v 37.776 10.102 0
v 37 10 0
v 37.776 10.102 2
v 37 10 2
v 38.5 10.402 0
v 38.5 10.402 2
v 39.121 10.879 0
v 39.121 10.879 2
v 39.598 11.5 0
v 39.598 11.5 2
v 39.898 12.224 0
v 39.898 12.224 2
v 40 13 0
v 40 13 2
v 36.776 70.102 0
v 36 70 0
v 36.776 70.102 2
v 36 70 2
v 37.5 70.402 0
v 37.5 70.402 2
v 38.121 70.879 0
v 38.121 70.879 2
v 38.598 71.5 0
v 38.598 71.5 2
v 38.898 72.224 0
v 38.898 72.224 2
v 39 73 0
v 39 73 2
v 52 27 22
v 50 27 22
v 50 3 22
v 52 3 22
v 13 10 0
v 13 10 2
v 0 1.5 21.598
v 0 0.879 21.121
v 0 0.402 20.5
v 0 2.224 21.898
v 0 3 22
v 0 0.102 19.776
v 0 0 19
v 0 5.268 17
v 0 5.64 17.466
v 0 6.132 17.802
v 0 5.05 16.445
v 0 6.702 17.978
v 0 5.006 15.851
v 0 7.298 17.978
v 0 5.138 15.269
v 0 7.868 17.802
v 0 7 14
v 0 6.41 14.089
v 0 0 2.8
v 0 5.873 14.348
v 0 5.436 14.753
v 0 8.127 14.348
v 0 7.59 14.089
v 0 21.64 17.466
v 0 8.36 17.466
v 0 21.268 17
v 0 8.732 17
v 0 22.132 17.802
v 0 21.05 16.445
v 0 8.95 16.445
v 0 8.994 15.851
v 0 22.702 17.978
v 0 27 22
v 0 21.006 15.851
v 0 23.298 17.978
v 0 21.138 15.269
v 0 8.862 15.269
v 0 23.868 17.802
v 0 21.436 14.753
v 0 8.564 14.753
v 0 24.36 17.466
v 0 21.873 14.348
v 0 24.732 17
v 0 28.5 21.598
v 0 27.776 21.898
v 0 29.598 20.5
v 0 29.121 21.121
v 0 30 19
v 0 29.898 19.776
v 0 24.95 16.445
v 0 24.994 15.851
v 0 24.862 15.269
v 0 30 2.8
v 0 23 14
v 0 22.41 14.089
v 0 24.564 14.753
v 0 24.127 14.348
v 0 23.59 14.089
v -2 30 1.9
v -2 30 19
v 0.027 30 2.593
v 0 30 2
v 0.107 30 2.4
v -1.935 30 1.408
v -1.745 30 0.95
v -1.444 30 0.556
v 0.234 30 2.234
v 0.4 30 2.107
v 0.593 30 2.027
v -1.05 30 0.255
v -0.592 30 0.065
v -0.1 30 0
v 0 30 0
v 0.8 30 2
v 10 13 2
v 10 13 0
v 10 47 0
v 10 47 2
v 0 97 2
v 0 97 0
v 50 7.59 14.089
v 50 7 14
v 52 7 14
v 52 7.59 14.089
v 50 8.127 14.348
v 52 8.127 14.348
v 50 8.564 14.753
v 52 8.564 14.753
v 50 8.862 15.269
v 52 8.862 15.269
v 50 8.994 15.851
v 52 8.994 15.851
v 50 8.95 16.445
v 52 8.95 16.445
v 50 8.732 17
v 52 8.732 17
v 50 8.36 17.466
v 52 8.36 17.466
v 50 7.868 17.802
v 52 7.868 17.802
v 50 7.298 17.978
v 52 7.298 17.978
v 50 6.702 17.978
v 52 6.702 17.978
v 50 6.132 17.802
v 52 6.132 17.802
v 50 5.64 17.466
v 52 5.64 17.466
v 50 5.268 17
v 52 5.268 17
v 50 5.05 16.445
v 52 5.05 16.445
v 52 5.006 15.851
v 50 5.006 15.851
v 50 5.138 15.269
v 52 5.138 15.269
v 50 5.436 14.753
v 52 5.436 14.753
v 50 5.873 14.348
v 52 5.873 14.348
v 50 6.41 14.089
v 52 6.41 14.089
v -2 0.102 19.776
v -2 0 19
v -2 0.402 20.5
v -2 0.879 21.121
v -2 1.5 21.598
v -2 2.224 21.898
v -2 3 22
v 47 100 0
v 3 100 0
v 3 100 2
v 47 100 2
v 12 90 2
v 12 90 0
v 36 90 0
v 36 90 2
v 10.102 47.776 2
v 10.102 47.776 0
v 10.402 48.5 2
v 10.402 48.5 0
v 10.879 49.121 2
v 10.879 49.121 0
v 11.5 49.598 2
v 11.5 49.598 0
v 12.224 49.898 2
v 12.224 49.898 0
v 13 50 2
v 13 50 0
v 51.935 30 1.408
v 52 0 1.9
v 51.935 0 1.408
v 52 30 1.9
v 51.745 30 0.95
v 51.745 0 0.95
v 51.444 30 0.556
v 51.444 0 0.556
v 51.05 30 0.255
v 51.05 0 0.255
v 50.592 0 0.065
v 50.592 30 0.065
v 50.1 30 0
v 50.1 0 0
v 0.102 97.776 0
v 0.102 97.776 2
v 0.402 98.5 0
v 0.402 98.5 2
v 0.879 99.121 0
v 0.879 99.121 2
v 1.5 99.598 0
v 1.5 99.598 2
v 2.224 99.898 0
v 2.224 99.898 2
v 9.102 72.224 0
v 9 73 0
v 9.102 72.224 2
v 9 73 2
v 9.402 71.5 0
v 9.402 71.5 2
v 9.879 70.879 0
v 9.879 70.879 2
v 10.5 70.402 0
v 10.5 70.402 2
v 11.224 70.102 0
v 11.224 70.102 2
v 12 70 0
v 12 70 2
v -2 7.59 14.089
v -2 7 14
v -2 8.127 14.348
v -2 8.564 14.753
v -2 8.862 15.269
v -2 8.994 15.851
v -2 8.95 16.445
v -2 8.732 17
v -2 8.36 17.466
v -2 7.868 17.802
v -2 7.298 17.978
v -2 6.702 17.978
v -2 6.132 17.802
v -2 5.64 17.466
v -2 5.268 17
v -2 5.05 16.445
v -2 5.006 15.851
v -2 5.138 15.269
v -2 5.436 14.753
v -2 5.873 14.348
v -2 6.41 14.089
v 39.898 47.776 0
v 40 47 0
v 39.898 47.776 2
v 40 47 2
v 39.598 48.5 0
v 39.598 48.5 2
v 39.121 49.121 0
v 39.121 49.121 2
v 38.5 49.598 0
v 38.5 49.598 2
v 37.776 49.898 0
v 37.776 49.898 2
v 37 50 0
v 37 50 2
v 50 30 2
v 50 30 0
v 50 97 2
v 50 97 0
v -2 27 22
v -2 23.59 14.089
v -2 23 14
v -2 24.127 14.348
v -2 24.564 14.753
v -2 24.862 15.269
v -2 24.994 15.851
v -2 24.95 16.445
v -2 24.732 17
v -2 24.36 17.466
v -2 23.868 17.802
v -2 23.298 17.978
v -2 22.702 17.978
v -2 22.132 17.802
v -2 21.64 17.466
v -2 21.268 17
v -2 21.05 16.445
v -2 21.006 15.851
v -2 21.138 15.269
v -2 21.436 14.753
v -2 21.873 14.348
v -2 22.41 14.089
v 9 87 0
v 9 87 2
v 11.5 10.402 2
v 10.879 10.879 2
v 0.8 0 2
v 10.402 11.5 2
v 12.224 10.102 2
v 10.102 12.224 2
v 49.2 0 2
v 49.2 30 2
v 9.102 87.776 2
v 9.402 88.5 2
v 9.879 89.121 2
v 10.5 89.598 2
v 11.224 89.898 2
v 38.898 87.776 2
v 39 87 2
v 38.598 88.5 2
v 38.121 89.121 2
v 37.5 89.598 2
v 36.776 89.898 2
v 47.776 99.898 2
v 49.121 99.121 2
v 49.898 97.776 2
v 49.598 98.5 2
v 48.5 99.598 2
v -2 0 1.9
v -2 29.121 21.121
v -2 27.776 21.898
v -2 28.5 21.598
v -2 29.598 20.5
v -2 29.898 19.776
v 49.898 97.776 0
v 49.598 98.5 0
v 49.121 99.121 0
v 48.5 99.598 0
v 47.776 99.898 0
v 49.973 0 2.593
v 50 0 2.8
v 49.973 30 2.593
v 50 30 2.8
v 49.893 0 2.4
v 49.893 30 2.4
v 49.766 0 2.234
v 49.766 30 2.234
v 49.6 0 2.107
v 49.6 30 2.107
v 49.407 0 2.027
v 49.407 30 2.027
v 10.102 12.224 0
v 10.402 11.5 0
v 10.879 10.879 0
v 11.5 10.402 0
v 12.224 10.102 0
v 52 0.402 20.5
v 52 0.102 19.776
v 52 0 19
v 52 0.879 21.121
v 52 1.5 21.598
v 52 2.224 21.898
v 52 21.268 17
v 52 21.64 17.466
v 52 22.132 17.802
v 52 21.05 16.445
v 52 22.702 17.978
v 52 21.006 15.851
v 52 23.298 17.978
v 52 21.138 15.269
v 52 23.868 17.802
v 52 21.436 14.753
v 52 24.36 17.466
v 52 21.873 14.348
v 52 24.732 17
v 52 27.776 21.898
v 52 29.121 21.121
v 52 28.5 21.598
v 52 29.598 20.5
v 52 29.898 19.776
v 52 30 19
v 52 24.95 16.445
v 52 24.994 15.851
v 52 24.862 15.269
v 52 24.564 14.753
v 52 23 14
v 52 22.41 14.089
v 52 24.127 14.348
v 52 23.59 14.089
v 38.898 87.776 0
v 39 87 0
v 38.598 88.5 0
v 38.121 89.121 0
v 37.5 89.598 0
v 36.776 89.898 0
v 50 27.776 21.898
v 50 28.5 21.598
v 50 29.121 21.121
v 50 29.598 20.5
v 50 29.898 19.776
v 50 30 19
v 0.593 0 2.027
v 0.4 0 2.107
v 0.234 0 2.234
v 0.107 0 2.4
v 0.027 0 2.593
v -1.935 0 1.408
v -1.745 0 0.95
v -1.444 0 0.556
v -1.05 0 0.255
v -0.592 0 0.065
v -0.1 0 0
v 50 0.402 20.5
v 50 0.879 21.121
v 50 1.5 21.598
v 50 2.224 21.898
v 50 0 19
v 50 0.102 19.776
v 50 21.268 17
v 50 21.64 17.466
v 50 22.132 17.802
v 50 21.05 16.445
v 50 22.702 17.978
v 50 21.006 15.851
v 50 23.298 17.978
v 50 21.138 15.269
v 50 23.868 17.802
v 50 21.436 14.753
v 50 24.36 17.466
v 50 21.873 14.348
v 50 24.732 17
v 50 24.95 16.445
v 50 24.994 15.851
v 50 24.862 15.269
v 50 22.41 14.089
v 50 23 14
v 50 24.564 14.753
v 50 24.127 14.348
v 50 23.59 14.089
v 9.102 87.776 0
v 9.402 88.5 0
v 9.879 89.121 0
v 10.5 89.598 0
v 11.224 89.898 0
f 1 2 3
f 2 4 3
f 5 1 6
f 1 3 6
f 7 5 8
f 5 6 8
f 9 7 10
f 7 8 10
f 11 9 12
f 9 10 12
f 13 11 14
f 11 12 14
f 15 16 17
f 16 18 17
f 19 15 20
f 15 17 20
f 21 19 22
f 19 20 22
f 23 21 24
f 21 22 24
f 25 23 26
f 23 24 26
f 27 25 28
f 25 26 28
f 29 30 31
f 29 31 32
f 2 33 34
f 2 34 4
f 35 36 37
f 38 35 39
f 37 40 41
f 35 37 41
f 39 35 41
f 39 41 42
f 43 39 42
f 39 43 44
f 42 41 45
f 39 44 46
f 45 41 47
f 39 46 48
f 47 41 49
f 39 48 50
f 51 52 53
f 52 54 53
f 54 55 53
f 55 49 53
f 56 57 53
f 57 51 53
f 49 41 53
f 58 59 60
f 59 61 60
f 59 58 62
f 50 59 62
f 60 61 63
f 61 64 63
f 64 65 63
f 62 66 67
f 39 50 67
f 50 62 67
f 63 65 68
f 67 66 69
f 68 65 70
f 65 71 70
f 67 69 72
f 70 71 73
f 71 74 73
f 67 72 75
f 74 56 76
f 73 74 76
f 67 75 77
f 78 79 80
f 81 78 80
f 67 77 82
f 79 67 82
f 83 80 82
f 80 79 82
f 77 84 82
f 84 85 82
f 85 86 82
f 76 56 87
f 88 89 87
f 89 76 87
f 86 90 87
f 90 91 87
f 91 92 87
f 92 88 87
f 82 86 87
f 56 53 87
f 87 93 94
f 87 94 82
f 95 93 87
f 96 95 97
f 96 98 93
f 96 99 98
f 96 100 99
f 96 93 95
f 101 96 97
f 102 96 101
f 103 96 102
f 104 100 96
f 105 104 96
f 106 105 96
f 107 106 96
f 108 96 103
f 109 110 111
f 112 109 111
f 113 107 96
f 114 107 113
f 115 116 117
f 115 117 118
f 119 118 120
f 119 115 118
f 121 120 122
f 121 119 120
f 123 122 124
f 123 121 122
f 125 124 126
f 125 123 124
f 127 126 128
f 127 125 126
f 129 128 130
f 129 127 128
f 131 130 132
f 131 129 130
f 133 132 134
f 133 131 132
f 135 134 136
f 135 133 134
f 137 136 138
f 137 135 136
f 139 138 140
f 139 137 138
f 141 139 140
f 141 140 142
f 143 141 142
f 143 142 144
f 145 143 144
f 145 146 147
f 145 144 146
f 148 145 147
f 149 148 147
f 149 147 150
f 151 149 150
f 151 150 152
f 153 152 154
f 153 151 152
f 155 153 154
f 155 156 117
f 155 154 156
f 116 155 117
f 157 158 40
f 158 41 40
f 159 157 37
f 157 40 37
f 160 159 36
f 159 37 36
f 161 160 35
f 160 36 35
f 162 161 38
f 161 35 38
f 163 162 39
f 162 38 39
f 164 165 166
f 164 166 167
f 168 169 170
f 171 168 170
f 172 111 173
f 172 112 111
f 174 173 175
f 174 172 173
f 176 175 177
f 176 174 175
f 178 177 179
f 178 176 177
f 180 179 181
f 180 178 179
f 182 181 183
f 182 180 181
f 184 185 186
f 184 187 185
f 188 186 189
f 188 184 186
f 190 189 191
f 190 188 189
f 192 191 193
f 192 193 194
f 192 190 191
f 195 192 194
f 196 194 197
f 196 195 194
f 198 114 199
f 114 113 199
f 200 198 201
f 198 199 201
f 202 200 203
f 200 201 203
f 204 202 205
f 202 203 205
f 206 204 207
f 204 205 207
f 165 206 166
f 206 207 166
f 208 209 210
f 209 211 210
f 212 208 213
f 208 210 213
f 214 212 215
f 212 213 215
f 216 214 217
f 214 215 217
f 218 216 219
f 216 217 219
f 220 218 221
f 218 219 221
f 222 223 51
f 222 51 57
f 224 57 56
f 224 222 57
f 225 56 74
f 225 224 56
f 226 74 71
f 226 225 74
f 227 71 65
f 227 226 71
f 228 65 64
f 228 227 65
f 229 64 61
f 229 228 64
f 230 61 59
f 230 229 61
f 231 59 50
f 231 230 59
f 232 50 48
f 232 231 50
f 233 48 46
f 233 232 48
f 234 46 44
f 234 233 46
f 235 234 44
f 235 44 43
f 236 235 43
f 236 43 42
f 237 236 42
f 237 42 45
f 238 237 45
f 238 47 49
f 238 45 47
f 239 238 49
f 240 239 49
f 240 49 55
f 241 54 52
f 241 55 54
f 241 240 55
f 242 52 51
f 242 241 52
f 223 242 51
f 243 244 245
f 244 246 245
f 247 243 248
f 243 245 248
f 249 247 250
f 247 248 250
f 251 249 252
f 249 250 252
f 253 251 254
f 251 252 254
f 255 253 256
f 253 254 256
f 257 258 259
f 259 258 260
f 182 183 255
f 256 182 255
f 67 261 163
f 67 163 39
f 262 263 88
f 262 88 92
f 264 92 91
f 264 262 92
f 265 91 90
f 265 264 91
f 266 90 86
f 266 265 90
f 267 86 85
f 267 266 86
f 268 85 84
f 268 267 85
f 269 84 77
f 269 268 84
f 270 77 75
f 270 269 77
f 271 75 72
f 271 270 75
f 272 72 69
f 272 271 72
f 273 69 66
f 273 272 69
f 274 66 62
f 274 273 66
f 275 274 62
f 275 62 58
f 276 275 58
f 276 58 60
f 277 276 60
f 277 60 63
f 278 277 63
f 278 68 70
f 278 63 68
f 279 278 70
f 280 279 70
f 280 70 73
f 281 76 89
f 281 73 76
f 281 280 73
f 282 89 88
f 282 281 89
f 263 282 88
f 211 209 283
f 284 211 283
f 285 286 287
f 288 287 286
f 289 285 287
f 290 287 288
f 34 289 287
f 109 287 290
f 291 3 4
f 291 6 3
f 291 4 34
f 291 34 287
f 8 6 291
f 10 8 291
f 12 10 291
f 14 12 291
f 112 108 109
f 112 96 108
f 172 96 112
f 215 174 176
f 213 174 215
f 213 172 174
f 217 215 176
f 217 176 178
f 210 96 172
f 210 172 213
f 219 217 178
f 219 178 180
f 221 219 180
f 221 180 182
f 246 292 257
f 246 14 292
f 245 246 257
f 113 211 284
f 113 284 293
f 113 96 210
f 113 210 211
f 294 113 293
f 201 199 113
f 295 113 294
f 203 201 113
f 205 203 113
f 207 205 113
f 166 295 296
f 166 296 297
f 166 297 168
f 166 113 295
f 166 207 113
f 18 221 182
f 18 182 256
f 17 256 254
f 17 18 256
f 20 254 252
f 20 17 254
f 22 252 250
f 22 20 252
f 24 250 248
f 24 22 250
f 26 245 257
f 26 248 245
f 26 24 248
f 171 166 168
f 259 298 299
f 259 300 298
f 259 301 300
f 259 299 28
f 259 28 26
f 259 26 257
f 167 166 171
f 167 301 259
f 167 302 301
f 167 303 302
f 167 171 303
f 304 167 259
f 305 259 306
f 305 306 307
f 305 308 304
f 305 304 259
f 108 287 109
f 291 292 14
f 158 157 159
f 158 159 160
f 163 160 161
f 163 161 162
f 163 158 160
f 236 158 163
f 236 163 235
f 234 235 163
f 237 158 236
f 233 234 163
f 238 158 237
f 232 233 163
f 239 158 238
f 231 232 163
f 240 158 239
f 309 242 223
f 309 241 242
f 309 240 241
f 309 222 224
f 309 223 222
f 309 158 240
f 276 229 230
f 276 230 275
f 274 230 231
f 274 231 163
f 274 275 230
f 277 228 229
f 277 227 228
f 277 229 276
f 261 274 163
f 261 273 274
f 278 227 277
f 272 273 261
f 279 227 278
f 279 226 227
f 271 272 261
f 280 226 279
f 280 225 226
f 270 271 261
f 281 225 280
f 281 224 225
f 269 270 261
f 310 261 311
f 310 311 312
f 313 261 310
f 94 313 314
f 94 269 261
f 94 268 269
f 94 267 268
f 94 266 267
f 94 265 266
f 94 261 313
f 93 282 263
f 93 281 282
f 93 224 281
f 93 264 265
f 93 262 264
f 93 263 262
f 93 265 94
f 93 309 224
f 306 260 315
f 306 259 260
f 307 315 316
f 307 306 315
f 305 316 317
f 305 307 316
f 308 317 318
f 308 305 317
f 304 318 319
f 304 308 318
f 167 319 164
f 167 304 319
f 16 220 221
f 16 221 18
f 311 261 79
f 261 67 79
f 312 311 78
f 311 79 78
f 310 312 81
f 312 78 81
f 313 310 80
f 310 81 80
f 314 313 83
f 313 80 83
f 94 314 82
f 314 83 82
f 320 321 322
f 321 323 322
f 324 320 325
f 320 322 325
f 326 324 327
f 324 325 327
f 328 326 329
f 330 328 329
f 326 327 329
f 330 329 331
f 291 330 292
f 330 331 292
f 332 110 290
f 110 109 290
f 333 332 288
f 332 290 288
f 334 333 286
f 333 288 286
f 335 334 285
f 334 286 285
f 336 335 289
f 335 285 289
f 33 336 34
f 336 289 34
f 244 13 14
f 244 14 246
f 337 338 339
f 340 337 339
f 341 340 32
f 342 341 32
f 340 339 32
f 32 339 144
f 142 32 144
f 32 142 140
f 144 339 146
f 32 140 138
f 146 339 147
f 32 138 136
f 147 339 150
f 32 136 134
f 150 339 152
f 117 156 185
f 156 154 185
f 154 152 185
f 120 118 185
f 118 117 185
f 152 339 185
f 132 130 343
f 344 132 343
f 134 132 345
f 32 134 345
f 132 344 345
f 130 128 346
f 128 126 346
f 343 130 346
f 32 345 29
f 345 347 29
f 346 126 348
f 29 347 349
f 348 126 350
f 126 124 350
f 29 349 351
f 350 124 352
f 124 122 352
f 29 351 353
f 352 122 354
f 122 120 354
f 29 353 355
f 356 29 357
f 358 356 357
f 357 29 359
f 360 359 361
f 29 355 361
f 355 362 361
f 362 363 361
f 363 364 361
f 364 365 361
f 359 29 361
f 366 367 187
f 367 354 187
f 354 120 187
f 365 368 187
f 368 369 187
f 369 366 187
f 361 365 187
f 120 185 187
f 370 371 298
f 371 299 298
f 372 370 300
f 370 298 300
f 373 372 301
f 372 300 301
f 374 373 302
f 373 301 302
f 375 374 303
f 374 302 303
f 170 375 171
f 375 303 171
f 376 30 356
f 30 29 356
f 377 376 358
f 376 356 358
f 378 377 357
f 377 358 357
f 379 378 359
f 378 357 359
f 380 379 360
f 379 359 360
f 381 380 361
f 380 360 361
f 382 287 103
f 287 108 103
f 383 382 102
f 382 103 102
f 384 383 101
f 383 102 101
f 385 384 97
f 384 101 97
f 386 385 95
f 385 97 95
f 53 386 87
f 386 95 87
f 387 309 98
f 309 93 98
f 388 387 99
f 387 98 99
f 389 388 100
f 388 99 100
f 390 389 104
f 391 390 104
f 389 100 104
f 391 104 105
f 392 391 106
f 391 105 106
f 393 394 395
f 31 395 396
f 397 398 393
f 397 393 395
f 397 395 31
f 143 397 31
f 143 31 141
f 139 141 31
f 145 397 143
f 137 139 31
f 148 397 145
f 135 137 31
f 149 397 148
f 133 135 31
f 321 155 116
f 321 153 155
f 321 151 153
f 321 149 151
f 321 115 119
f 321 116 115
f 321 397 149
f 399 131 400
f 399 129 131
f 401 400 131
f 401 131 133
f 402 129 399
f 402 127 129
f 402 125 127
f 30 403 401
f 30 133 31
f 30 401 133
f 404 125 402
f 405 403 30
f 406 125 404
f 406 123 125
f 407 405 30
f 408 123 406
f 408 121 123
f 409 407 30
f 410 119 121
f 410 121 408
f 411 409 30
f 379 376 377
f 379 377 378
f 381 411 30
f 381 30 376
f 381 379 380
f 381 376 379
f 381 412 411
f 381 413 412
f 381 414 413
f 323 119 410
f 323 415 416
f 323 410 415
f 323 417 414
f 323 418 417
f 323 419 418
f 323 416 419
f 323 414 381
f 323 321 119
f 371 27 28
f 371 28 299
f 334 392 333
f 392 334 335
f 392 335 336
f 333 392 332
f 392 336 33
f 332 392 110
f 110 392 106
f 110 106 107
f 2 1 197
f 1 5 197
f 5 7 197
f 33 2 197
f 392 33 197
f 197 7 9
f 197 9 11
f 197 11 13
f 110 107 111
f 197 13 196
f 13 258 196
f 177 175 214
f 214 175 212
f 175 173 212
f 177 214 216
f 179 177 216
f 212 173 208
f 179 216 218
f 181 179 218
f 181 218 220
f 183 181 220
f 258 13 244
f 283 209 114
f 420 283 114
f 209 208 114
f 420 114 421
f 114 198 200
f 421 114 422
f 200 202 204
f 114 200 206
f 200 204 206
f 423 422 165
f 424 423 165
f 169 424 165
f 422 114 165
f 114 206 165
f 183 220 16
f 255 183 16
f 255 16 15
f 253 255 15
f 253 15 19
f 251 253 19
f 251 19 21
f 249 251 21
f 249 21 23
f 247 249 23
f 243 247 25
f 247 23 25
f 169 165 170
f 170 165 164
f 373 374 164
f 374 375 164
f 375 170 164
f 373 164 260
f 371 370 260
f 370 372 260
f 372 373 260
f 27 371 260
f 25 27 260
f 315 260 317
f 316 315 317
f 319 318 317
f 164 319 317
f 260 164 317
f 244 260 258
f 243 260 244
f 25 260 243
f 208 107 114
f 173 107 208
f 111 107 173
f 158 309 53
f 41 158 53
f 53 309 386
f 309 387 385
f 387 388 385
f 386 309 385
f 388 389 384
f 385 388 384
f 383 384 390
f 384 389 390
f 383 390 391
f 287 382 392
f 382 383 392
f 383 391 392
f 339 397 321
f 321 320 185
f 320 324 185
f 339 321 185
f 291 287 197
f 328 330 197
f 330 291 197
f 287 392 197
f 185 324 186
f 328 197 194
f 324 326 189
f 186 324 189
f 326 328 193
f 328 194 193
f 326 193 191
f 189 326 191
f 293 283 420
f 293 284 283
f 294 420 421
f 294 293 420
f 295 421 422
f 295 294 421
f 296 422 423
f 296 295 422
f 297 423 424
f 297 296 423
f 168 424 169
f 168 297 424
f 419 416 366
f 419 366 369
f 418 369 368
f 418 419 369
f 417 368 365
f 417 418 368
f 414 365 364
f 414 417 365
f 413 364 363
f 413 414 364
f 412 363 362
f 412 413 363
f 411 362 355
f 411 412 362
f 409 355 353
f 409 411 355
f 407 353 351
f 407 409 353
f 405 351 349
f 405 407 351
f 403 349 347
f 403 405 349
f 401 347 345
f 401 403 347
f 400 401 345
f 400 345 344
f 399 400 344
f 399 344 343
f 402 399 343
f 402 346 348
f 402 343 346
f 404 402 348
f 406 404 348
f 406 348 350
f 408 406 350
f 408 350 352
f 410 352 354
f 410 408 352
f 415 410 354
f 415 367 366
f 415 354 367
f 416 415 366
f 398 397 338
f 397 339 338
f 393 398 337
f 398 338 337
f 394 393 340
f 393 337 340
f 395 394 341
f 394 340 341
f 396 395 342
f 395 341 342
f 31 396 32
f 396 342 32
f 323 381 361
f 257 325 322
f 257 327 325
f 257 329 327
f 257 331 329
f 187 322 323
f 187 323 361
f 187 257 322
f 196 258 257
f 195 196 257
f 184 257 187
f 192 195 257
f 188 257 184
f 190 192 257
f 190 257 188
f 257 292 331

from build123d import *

# Parameters (mm, degrees)
BOX004_W          = 30
BOX004_H          = 20
BOX004_DEPTH      = 7
BOX003_W          = 30
BOX003_H          = 40
BOX003_DEPTH      = 6
CYLINDER001_R     = 2
CYLINDER001_DEPTH = 59
CYLINDER_R        = 2
CYLINDER_DEPTH    = 59
BOX002_W          = 2
BOX002_H          = 30
BOX002_DEPTH      = 22
FILLET_R          = 1.9
BOX001_W          = 2
BOX001_H          = 30
BOX001_DEPTH      = 22
FILLET001_R       = 1.9
BOX_W             = 50
BOX_H             = 100
BOX_DEPTH         = 2
FILLET002_R       = 0.8
FILLET003_R       = 3
FILLET004_R       = 3
FILLET005_R       = 3
FILLET006_R       = 3


with BuildPart() as cub001:
    # Box004 → Box004 (new body)
    with BuildSketch(Plane(origin=(9, 70, -3), x_dir=(1, 0, 0), z_dir=(0, 0, 1))):
        with Locations((15, 10)):
            Rectangle(BOX004_W, BOX004_H)
    extrude(amount=BOX004_DEPTH)


with BuildPart() as cub:
    # Box003 → Box003 (new body)
    with BuildSketch(Plane(origin=(10, 10, -2), x_dir=(1, 0, 0), z_dir=(0, 0, 1))):
        with Locations((15, 20)):
            Rectangle(BOX003_W, BOX003_H)
    extrude(amount=BOX003_DEPTH)


with BuildPart() as cilindre001:
    # Cylinder001 → Cylinder001 (new body)
    with BuildSketch(Plane(origin=(-4, 23, 13), x_dir=(0, 0, -1), z_dir=(1, 0, 0))):
        Circle(CYLINDER001_R)
    extrude(amount=CYLINDER001_DEPTH)


with BuildPart() as cylinders:
    # Cylinder → Cylinder (new body)
    with BuildSketch(Plane(origin=(-4, 7, 13), x_dir=(0, 0, -1), z_dir=(1, 0, 0))):
        Circle(CYLINDER_R)
    extrude(amount=CYLINDER_DEPTH)

    # Fusion001: union Cilindre001
    add(cilindre001.part)


with BuildPart() as cylinders_1:
    # Fusion001 placement: moved
    add(cylinders.part.moved(Location((0, 0, 3))))


with BuildPart() as fillet_body:
    # Box002 → Box002 (new body)
    with BuildSketch(Plane(origin=(-2, 0, 0), x_dir=(1, 0, 0), z_dir=(0, 0, 1))):
        with Locations((1, 15)):
            Rectangle(BOX002_W, BOX002_H)
    extrude(amount=BOX002_DEPTH)

    # Fillet
    fillet_edges = [fillet_body.edges().sort_by_distance(p)[0] for p in [
        (-2, 15, 0),
    ]]
    fillet(fillet_edges, radius=FILLET_R)


with BuildPart() as fillet001:
    # Box001 → Box001 (new body)
    with BuildSketch(Plane(origin=(50, 0, 0), x_dir=(1, 0, 0), z_dir=(0, 0, 1))):
        with Locations((1, 15)):
            Rectangle(BOX001_W, BOX001_H)
    extrude(amount=BOX001_DEPTH)

    # Fillet001
    fillet001_edges = [fillet001.edges().sort_by_distance(p)[0] for p in [
        (52, 15, 0),
    ]]
    fillet(fillet001_edges, radius=FILLET001_R)


with BuildPart() as universal_suport:
    # Box → Box (new body)
    with BuildSketch(Plane.XY):
        with Locations((25, 50)):
            Rectangle(BOX_W, BOX_H)
    extrude(amount=BOX_DEPTH)

    # Fusion: union Fillet body, Fillet001
    add(fillet_body.part)
    add(fillet001.part)

    # Fillet002
    fillet002_edges = [universal_suport.edges().sort_by_distance(p)[0] for p in [
        (0, 15, 2),
        (50, 15, 2),
    ]]
    fillet(fillet002_edges, radius=FILLET002_R)

    # Cut: cut cylinders
    add(cylinders_1.part, mode=Mode.SUBTRACT)

    # Fillet003
    fillet003_edges = [universal_suport.edges().sort_by_distance(p)[0] for p in [
        (-1, 30, 22),
        (-1, 0, 22),
        (51, 0, 22),
        (51, 30, 22),
    ]]
    fillet(fillet003_edges, radius=FILLET003_R)

    # Fillet004
    fillet004_edges = [universal_suport.edges().sort_by_distance(p)[0] for p in [
        (0, 100, 1),
        (50, 100, 1),
    ]]
    fillet(fillet004_edges, radius=FILLET004_R)

    # Cut001: cut Cub
    add(cub.part, mode=Mode.SUBTRACT)

    # Fillet005
    fillet005_edges = [universal_suport.edges().sort_by_distance(p)[0] for p in [
        (40, 10, 1),
        (10, 10, 1),
        (40, 50, 1),
        (10, 50, 1),
    ]]
    fillet(fillet005_edges, radius=FILLET005_R)

    # Cut002: cut Cub001
    add(cub001.part, mode=Mode.SUBTRACT)

    # Fillet006
    fillet006_edges = [universal_suport.edges().sort_by_distance(p)[0] for p in [
        (39, 70, 1),
        (9, 70, 1),
        (39, 90, 1),
        (9, 90, 1),
    ]]
    fillet(fillet006_edges, radius=FILLET006_R)


solid = universal_suport.part
